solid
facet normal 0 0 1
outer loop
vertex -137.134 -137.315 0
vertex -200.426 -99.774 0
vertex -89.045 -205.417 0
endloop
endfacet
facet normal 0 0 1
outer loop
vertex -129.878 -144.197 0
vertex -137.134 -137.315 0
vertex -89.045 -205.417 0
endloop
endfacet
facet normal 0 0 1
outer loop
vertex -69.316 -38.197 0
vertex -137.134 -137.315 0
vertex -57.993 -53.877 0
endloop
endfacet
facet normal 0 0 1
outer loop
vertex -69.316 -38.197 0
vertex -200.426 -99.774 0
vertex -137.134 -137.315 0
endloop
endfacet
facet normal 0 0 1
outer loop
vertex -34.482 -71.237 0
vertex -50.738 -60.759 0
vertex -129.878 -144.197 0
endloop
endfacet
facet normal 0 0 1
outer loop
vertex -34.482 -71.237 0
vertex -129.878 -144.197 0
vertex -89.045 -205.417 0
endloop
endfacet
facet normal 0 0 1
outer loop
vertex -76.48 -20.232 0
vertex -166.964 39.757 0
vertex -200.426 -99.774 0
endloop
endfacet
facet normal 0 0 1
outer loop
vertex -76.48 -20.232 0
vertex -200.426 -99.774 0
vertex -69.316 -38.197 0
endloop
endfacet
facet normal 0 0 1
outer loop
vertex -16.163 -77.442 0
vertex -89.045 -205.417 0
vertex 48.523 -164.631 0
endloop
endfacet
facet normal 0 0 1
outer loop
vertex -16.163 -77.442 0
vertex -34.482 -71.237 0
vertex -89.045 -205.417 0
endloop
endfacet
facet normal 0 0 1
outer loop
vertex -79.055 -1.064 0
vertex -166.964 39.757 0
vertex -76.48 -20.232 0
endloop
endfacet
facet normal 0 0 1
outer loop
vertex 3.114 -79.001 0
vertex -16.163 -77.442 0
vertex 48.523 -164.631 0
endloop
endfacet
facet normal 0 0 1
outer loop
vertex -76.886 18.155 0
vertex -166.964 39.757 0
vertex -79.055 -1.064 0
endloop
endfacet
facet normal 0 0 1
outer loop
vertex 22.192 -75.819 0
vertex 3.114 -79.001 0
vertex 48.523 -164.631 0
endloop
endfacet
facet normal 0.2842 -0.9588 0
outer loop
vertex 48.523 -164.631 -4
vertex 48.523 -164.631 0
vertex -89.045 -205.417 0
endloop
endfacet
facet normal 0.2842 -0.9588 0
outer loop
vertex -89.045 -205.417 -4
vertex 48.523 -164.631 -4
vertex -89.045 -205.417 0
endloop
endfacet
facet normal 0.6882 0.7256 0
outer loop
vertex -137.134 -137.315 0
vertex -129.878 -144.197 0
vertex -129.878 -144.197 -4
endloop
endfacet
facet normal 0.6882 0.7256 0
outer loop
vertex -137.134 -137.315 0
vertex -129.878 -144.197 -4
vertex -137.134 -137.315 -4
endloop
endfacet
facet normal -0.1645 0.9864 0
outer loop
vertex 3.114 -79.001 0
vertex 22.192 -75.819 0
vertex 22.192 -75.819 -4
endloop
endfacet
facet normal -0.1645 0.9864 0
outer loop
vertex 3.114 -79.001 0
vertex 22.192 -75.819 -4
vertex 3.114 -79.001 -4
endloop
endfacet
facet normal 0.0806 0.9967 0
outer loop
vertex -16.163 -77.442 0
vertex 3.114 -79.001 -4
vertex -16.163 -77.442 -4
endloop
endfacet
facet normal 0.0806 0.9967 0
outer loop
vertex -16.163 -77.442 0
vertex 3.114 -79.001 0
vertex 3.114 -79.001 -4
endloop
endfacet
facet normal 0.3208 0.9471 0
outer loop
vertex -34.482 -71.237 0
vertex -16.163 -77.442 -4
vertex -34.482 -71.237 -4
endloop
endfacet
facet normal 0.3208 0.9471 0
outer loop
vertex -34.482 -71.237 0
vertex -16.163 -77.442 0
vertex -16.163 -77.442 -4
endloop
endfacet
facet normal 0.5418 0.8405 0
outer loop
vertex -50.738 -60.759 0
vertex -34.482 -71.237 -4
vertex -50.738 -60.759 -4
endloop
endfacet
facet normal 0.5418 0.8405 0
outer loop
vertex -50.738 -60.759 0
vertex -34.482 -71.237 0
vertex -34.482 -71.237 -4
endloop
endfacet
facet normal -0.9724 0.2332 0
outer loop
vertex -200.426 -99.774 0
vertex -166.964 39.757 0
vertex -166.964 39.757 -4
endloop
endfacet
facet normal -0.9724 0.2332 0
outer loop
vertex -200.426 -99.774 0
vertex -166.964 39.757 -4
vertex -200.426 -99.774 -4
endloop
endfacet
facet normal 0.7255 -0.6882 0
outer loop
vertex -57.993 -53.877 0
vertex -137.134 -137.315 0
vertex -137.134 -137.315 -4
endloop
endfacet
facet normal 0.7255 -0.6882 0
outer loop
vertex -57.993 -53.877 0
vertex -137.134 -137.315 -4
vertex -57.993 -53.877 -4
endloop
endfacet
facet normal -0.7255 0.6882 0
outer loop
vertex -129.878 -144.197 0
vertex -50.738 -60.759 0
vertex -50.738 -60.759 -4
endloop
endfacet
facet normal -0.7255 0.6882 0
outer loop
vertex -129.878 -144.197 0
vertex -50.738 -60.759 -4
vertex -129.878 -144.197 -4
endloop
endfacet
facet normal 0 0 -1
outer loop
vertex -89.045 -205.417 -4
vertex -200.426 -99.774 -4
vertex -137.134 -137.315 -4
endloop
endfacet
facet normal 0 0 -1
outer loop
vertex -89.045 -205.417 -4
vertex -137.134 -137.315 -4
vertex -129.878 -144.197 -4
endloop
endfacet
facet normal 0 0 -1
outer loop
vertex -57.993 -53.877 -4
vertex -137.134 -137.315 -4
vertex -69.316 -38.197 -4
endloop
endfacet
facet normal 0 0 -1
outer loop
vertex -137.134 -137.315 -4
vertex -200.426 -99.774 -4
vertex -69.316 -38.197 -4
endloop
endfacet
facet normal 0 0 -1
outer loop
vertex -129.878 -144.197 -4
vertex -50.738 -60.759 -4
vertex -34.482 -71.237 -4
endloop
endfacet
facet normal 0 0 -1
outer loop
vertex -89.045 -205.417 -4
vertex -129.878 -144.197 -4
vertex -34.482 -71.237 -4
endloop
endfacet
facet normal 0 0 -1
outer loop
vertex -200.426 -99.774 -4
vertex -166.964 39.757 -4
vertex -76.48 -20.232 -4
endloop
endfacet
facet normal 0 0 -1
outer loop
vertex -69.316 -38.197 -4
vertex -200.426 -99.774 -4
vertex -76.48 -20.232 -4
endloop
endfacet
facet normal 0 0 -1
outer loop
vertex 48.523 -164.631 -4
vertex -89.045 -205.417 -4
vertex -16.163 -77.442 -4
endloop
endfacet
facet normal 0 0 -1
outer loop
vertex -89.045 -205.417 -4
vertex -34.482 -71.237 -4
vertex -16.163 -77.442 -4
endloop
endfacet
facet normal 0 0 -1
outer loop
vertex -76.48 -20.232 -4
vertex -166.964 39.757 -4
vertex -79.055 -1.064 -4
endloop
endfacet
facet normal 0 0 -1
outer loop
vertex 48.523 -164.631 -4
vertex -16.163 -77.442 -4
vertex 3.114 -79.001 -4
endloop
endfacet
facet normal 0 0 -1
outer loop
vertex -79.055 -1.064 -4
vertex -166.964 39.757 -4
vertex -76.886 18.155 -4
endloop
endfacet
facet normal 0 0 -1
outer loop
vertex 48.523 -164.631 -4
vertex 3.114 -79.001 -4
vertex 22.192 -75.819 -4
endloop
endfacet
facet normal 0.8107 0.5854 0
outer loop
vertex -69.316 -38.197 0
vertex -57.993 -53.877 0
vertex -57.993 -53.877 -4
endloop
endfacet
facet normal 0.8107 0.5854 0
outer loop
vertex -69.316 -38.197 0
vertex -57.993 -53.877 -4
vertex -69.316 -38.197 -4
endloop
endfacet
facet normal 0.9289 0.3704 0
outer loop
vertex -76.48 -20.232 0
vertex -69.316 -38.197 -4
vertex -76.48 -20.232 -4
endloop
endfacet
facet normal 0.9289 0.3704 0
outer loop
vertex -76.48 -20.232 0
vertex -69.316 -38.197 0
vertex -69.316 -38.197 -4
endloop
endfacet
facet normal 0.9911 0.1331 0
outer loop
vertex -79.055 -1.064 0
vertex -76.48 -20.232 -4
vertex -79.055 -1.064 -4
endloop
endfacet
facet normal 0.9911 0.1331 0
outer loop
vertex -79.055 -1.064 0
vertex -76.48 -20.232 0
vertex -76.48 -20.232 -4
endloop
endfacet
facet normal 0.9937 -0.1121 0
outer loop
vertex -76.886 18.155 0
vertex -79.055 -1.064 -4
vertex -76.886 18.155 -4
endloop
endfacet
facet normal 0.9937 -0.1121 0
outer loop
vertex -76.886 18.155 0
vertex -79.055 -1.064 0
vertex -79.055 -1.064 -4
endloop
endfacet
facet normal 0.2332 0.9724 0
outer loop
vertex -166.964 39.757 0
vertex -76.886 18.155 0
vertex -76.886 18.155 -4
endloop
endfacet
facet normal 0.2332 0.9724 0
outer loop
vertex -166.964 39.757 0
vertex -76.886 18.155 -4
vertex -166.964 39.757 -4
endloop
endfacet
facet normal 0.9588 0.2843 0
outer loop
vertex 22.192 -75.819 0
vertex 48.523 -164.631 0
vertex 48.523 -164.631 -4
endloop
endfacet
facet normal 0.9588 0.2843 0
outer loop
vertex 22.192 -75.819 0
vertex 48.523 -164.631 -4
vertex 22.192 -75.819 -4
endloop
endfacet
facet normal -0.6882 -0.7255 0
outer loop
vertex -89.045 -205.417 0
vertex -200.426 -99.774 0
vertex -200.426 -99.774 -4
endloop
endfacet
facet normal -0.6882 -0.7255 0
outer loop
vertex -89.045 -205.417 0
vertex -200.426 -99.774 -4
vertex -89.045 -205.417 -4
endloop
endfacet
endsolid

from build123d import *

# Parameters (mm, degrees)
BOSS_EXTRU_1_DEPTH      = 4
ENL_V_MAT_EXTRU_2_DEPTH = 10


with BuildPart() as part:
    # Esquisse1 → Boss.-Extru.1 (new body)
    with BuildSketch(Plane.XY):
        with BuildLine():
            Line((-252.479191453, -50.401668407), (-36.99219102, -254.789419126))
            Line((-36.99219102, -254.789419126), (48.52273895, -164.630612218))
            Line((48.52273895, -164.630612218), (22.191553545, -75.81909358))
            ThreePointArc((22.191553545, -75.81909358), (-16.163403148, -77.442245684), (-50.738038063, -60.758962249))
            Line((-50.738038063, -60.758962249), (-129.87807622, -144.196689689))
            Line((-129.87807622, -144.196689689), (-137.13353078, -137.314947241))
            Line((-137.13353078, -137.314947241), (-57.993492623, -53.8772198))
            ThreePointArc((-57.993492623, -53.8772198), (-76.480137606, -20.232290272), (-76.885637492, 18.154854653))
            Line((-76.885637492, 18.154854653), (-166.964261484, 39.757138501))
            Line((-166.964261484, 39.757138501), (-252.479191453, -50.401668407))
        make_face()
    extrude(amount=-BOSS_EXTRU_1_DEPTH)

    # Esquisse3 → Enlèv. mat.-Extru.2 (cut)
    with BuildSketch(Plane.XY):
        Polygon((-166.964261484, 39.757138501), (-200.425980015, -99.773736244), (-252.479191453, -50.401668407), align=None)
        Polygon((-36.99219102, -254.789419126), (48.52273895, -164.630612218), (-89.045402457, -205.417351289), align=None)
    extrude(amount=-ENL_V_MAT_EXTRU_2_DEPTH, mode=Mode.SUBTRACT)


solid = part.part
